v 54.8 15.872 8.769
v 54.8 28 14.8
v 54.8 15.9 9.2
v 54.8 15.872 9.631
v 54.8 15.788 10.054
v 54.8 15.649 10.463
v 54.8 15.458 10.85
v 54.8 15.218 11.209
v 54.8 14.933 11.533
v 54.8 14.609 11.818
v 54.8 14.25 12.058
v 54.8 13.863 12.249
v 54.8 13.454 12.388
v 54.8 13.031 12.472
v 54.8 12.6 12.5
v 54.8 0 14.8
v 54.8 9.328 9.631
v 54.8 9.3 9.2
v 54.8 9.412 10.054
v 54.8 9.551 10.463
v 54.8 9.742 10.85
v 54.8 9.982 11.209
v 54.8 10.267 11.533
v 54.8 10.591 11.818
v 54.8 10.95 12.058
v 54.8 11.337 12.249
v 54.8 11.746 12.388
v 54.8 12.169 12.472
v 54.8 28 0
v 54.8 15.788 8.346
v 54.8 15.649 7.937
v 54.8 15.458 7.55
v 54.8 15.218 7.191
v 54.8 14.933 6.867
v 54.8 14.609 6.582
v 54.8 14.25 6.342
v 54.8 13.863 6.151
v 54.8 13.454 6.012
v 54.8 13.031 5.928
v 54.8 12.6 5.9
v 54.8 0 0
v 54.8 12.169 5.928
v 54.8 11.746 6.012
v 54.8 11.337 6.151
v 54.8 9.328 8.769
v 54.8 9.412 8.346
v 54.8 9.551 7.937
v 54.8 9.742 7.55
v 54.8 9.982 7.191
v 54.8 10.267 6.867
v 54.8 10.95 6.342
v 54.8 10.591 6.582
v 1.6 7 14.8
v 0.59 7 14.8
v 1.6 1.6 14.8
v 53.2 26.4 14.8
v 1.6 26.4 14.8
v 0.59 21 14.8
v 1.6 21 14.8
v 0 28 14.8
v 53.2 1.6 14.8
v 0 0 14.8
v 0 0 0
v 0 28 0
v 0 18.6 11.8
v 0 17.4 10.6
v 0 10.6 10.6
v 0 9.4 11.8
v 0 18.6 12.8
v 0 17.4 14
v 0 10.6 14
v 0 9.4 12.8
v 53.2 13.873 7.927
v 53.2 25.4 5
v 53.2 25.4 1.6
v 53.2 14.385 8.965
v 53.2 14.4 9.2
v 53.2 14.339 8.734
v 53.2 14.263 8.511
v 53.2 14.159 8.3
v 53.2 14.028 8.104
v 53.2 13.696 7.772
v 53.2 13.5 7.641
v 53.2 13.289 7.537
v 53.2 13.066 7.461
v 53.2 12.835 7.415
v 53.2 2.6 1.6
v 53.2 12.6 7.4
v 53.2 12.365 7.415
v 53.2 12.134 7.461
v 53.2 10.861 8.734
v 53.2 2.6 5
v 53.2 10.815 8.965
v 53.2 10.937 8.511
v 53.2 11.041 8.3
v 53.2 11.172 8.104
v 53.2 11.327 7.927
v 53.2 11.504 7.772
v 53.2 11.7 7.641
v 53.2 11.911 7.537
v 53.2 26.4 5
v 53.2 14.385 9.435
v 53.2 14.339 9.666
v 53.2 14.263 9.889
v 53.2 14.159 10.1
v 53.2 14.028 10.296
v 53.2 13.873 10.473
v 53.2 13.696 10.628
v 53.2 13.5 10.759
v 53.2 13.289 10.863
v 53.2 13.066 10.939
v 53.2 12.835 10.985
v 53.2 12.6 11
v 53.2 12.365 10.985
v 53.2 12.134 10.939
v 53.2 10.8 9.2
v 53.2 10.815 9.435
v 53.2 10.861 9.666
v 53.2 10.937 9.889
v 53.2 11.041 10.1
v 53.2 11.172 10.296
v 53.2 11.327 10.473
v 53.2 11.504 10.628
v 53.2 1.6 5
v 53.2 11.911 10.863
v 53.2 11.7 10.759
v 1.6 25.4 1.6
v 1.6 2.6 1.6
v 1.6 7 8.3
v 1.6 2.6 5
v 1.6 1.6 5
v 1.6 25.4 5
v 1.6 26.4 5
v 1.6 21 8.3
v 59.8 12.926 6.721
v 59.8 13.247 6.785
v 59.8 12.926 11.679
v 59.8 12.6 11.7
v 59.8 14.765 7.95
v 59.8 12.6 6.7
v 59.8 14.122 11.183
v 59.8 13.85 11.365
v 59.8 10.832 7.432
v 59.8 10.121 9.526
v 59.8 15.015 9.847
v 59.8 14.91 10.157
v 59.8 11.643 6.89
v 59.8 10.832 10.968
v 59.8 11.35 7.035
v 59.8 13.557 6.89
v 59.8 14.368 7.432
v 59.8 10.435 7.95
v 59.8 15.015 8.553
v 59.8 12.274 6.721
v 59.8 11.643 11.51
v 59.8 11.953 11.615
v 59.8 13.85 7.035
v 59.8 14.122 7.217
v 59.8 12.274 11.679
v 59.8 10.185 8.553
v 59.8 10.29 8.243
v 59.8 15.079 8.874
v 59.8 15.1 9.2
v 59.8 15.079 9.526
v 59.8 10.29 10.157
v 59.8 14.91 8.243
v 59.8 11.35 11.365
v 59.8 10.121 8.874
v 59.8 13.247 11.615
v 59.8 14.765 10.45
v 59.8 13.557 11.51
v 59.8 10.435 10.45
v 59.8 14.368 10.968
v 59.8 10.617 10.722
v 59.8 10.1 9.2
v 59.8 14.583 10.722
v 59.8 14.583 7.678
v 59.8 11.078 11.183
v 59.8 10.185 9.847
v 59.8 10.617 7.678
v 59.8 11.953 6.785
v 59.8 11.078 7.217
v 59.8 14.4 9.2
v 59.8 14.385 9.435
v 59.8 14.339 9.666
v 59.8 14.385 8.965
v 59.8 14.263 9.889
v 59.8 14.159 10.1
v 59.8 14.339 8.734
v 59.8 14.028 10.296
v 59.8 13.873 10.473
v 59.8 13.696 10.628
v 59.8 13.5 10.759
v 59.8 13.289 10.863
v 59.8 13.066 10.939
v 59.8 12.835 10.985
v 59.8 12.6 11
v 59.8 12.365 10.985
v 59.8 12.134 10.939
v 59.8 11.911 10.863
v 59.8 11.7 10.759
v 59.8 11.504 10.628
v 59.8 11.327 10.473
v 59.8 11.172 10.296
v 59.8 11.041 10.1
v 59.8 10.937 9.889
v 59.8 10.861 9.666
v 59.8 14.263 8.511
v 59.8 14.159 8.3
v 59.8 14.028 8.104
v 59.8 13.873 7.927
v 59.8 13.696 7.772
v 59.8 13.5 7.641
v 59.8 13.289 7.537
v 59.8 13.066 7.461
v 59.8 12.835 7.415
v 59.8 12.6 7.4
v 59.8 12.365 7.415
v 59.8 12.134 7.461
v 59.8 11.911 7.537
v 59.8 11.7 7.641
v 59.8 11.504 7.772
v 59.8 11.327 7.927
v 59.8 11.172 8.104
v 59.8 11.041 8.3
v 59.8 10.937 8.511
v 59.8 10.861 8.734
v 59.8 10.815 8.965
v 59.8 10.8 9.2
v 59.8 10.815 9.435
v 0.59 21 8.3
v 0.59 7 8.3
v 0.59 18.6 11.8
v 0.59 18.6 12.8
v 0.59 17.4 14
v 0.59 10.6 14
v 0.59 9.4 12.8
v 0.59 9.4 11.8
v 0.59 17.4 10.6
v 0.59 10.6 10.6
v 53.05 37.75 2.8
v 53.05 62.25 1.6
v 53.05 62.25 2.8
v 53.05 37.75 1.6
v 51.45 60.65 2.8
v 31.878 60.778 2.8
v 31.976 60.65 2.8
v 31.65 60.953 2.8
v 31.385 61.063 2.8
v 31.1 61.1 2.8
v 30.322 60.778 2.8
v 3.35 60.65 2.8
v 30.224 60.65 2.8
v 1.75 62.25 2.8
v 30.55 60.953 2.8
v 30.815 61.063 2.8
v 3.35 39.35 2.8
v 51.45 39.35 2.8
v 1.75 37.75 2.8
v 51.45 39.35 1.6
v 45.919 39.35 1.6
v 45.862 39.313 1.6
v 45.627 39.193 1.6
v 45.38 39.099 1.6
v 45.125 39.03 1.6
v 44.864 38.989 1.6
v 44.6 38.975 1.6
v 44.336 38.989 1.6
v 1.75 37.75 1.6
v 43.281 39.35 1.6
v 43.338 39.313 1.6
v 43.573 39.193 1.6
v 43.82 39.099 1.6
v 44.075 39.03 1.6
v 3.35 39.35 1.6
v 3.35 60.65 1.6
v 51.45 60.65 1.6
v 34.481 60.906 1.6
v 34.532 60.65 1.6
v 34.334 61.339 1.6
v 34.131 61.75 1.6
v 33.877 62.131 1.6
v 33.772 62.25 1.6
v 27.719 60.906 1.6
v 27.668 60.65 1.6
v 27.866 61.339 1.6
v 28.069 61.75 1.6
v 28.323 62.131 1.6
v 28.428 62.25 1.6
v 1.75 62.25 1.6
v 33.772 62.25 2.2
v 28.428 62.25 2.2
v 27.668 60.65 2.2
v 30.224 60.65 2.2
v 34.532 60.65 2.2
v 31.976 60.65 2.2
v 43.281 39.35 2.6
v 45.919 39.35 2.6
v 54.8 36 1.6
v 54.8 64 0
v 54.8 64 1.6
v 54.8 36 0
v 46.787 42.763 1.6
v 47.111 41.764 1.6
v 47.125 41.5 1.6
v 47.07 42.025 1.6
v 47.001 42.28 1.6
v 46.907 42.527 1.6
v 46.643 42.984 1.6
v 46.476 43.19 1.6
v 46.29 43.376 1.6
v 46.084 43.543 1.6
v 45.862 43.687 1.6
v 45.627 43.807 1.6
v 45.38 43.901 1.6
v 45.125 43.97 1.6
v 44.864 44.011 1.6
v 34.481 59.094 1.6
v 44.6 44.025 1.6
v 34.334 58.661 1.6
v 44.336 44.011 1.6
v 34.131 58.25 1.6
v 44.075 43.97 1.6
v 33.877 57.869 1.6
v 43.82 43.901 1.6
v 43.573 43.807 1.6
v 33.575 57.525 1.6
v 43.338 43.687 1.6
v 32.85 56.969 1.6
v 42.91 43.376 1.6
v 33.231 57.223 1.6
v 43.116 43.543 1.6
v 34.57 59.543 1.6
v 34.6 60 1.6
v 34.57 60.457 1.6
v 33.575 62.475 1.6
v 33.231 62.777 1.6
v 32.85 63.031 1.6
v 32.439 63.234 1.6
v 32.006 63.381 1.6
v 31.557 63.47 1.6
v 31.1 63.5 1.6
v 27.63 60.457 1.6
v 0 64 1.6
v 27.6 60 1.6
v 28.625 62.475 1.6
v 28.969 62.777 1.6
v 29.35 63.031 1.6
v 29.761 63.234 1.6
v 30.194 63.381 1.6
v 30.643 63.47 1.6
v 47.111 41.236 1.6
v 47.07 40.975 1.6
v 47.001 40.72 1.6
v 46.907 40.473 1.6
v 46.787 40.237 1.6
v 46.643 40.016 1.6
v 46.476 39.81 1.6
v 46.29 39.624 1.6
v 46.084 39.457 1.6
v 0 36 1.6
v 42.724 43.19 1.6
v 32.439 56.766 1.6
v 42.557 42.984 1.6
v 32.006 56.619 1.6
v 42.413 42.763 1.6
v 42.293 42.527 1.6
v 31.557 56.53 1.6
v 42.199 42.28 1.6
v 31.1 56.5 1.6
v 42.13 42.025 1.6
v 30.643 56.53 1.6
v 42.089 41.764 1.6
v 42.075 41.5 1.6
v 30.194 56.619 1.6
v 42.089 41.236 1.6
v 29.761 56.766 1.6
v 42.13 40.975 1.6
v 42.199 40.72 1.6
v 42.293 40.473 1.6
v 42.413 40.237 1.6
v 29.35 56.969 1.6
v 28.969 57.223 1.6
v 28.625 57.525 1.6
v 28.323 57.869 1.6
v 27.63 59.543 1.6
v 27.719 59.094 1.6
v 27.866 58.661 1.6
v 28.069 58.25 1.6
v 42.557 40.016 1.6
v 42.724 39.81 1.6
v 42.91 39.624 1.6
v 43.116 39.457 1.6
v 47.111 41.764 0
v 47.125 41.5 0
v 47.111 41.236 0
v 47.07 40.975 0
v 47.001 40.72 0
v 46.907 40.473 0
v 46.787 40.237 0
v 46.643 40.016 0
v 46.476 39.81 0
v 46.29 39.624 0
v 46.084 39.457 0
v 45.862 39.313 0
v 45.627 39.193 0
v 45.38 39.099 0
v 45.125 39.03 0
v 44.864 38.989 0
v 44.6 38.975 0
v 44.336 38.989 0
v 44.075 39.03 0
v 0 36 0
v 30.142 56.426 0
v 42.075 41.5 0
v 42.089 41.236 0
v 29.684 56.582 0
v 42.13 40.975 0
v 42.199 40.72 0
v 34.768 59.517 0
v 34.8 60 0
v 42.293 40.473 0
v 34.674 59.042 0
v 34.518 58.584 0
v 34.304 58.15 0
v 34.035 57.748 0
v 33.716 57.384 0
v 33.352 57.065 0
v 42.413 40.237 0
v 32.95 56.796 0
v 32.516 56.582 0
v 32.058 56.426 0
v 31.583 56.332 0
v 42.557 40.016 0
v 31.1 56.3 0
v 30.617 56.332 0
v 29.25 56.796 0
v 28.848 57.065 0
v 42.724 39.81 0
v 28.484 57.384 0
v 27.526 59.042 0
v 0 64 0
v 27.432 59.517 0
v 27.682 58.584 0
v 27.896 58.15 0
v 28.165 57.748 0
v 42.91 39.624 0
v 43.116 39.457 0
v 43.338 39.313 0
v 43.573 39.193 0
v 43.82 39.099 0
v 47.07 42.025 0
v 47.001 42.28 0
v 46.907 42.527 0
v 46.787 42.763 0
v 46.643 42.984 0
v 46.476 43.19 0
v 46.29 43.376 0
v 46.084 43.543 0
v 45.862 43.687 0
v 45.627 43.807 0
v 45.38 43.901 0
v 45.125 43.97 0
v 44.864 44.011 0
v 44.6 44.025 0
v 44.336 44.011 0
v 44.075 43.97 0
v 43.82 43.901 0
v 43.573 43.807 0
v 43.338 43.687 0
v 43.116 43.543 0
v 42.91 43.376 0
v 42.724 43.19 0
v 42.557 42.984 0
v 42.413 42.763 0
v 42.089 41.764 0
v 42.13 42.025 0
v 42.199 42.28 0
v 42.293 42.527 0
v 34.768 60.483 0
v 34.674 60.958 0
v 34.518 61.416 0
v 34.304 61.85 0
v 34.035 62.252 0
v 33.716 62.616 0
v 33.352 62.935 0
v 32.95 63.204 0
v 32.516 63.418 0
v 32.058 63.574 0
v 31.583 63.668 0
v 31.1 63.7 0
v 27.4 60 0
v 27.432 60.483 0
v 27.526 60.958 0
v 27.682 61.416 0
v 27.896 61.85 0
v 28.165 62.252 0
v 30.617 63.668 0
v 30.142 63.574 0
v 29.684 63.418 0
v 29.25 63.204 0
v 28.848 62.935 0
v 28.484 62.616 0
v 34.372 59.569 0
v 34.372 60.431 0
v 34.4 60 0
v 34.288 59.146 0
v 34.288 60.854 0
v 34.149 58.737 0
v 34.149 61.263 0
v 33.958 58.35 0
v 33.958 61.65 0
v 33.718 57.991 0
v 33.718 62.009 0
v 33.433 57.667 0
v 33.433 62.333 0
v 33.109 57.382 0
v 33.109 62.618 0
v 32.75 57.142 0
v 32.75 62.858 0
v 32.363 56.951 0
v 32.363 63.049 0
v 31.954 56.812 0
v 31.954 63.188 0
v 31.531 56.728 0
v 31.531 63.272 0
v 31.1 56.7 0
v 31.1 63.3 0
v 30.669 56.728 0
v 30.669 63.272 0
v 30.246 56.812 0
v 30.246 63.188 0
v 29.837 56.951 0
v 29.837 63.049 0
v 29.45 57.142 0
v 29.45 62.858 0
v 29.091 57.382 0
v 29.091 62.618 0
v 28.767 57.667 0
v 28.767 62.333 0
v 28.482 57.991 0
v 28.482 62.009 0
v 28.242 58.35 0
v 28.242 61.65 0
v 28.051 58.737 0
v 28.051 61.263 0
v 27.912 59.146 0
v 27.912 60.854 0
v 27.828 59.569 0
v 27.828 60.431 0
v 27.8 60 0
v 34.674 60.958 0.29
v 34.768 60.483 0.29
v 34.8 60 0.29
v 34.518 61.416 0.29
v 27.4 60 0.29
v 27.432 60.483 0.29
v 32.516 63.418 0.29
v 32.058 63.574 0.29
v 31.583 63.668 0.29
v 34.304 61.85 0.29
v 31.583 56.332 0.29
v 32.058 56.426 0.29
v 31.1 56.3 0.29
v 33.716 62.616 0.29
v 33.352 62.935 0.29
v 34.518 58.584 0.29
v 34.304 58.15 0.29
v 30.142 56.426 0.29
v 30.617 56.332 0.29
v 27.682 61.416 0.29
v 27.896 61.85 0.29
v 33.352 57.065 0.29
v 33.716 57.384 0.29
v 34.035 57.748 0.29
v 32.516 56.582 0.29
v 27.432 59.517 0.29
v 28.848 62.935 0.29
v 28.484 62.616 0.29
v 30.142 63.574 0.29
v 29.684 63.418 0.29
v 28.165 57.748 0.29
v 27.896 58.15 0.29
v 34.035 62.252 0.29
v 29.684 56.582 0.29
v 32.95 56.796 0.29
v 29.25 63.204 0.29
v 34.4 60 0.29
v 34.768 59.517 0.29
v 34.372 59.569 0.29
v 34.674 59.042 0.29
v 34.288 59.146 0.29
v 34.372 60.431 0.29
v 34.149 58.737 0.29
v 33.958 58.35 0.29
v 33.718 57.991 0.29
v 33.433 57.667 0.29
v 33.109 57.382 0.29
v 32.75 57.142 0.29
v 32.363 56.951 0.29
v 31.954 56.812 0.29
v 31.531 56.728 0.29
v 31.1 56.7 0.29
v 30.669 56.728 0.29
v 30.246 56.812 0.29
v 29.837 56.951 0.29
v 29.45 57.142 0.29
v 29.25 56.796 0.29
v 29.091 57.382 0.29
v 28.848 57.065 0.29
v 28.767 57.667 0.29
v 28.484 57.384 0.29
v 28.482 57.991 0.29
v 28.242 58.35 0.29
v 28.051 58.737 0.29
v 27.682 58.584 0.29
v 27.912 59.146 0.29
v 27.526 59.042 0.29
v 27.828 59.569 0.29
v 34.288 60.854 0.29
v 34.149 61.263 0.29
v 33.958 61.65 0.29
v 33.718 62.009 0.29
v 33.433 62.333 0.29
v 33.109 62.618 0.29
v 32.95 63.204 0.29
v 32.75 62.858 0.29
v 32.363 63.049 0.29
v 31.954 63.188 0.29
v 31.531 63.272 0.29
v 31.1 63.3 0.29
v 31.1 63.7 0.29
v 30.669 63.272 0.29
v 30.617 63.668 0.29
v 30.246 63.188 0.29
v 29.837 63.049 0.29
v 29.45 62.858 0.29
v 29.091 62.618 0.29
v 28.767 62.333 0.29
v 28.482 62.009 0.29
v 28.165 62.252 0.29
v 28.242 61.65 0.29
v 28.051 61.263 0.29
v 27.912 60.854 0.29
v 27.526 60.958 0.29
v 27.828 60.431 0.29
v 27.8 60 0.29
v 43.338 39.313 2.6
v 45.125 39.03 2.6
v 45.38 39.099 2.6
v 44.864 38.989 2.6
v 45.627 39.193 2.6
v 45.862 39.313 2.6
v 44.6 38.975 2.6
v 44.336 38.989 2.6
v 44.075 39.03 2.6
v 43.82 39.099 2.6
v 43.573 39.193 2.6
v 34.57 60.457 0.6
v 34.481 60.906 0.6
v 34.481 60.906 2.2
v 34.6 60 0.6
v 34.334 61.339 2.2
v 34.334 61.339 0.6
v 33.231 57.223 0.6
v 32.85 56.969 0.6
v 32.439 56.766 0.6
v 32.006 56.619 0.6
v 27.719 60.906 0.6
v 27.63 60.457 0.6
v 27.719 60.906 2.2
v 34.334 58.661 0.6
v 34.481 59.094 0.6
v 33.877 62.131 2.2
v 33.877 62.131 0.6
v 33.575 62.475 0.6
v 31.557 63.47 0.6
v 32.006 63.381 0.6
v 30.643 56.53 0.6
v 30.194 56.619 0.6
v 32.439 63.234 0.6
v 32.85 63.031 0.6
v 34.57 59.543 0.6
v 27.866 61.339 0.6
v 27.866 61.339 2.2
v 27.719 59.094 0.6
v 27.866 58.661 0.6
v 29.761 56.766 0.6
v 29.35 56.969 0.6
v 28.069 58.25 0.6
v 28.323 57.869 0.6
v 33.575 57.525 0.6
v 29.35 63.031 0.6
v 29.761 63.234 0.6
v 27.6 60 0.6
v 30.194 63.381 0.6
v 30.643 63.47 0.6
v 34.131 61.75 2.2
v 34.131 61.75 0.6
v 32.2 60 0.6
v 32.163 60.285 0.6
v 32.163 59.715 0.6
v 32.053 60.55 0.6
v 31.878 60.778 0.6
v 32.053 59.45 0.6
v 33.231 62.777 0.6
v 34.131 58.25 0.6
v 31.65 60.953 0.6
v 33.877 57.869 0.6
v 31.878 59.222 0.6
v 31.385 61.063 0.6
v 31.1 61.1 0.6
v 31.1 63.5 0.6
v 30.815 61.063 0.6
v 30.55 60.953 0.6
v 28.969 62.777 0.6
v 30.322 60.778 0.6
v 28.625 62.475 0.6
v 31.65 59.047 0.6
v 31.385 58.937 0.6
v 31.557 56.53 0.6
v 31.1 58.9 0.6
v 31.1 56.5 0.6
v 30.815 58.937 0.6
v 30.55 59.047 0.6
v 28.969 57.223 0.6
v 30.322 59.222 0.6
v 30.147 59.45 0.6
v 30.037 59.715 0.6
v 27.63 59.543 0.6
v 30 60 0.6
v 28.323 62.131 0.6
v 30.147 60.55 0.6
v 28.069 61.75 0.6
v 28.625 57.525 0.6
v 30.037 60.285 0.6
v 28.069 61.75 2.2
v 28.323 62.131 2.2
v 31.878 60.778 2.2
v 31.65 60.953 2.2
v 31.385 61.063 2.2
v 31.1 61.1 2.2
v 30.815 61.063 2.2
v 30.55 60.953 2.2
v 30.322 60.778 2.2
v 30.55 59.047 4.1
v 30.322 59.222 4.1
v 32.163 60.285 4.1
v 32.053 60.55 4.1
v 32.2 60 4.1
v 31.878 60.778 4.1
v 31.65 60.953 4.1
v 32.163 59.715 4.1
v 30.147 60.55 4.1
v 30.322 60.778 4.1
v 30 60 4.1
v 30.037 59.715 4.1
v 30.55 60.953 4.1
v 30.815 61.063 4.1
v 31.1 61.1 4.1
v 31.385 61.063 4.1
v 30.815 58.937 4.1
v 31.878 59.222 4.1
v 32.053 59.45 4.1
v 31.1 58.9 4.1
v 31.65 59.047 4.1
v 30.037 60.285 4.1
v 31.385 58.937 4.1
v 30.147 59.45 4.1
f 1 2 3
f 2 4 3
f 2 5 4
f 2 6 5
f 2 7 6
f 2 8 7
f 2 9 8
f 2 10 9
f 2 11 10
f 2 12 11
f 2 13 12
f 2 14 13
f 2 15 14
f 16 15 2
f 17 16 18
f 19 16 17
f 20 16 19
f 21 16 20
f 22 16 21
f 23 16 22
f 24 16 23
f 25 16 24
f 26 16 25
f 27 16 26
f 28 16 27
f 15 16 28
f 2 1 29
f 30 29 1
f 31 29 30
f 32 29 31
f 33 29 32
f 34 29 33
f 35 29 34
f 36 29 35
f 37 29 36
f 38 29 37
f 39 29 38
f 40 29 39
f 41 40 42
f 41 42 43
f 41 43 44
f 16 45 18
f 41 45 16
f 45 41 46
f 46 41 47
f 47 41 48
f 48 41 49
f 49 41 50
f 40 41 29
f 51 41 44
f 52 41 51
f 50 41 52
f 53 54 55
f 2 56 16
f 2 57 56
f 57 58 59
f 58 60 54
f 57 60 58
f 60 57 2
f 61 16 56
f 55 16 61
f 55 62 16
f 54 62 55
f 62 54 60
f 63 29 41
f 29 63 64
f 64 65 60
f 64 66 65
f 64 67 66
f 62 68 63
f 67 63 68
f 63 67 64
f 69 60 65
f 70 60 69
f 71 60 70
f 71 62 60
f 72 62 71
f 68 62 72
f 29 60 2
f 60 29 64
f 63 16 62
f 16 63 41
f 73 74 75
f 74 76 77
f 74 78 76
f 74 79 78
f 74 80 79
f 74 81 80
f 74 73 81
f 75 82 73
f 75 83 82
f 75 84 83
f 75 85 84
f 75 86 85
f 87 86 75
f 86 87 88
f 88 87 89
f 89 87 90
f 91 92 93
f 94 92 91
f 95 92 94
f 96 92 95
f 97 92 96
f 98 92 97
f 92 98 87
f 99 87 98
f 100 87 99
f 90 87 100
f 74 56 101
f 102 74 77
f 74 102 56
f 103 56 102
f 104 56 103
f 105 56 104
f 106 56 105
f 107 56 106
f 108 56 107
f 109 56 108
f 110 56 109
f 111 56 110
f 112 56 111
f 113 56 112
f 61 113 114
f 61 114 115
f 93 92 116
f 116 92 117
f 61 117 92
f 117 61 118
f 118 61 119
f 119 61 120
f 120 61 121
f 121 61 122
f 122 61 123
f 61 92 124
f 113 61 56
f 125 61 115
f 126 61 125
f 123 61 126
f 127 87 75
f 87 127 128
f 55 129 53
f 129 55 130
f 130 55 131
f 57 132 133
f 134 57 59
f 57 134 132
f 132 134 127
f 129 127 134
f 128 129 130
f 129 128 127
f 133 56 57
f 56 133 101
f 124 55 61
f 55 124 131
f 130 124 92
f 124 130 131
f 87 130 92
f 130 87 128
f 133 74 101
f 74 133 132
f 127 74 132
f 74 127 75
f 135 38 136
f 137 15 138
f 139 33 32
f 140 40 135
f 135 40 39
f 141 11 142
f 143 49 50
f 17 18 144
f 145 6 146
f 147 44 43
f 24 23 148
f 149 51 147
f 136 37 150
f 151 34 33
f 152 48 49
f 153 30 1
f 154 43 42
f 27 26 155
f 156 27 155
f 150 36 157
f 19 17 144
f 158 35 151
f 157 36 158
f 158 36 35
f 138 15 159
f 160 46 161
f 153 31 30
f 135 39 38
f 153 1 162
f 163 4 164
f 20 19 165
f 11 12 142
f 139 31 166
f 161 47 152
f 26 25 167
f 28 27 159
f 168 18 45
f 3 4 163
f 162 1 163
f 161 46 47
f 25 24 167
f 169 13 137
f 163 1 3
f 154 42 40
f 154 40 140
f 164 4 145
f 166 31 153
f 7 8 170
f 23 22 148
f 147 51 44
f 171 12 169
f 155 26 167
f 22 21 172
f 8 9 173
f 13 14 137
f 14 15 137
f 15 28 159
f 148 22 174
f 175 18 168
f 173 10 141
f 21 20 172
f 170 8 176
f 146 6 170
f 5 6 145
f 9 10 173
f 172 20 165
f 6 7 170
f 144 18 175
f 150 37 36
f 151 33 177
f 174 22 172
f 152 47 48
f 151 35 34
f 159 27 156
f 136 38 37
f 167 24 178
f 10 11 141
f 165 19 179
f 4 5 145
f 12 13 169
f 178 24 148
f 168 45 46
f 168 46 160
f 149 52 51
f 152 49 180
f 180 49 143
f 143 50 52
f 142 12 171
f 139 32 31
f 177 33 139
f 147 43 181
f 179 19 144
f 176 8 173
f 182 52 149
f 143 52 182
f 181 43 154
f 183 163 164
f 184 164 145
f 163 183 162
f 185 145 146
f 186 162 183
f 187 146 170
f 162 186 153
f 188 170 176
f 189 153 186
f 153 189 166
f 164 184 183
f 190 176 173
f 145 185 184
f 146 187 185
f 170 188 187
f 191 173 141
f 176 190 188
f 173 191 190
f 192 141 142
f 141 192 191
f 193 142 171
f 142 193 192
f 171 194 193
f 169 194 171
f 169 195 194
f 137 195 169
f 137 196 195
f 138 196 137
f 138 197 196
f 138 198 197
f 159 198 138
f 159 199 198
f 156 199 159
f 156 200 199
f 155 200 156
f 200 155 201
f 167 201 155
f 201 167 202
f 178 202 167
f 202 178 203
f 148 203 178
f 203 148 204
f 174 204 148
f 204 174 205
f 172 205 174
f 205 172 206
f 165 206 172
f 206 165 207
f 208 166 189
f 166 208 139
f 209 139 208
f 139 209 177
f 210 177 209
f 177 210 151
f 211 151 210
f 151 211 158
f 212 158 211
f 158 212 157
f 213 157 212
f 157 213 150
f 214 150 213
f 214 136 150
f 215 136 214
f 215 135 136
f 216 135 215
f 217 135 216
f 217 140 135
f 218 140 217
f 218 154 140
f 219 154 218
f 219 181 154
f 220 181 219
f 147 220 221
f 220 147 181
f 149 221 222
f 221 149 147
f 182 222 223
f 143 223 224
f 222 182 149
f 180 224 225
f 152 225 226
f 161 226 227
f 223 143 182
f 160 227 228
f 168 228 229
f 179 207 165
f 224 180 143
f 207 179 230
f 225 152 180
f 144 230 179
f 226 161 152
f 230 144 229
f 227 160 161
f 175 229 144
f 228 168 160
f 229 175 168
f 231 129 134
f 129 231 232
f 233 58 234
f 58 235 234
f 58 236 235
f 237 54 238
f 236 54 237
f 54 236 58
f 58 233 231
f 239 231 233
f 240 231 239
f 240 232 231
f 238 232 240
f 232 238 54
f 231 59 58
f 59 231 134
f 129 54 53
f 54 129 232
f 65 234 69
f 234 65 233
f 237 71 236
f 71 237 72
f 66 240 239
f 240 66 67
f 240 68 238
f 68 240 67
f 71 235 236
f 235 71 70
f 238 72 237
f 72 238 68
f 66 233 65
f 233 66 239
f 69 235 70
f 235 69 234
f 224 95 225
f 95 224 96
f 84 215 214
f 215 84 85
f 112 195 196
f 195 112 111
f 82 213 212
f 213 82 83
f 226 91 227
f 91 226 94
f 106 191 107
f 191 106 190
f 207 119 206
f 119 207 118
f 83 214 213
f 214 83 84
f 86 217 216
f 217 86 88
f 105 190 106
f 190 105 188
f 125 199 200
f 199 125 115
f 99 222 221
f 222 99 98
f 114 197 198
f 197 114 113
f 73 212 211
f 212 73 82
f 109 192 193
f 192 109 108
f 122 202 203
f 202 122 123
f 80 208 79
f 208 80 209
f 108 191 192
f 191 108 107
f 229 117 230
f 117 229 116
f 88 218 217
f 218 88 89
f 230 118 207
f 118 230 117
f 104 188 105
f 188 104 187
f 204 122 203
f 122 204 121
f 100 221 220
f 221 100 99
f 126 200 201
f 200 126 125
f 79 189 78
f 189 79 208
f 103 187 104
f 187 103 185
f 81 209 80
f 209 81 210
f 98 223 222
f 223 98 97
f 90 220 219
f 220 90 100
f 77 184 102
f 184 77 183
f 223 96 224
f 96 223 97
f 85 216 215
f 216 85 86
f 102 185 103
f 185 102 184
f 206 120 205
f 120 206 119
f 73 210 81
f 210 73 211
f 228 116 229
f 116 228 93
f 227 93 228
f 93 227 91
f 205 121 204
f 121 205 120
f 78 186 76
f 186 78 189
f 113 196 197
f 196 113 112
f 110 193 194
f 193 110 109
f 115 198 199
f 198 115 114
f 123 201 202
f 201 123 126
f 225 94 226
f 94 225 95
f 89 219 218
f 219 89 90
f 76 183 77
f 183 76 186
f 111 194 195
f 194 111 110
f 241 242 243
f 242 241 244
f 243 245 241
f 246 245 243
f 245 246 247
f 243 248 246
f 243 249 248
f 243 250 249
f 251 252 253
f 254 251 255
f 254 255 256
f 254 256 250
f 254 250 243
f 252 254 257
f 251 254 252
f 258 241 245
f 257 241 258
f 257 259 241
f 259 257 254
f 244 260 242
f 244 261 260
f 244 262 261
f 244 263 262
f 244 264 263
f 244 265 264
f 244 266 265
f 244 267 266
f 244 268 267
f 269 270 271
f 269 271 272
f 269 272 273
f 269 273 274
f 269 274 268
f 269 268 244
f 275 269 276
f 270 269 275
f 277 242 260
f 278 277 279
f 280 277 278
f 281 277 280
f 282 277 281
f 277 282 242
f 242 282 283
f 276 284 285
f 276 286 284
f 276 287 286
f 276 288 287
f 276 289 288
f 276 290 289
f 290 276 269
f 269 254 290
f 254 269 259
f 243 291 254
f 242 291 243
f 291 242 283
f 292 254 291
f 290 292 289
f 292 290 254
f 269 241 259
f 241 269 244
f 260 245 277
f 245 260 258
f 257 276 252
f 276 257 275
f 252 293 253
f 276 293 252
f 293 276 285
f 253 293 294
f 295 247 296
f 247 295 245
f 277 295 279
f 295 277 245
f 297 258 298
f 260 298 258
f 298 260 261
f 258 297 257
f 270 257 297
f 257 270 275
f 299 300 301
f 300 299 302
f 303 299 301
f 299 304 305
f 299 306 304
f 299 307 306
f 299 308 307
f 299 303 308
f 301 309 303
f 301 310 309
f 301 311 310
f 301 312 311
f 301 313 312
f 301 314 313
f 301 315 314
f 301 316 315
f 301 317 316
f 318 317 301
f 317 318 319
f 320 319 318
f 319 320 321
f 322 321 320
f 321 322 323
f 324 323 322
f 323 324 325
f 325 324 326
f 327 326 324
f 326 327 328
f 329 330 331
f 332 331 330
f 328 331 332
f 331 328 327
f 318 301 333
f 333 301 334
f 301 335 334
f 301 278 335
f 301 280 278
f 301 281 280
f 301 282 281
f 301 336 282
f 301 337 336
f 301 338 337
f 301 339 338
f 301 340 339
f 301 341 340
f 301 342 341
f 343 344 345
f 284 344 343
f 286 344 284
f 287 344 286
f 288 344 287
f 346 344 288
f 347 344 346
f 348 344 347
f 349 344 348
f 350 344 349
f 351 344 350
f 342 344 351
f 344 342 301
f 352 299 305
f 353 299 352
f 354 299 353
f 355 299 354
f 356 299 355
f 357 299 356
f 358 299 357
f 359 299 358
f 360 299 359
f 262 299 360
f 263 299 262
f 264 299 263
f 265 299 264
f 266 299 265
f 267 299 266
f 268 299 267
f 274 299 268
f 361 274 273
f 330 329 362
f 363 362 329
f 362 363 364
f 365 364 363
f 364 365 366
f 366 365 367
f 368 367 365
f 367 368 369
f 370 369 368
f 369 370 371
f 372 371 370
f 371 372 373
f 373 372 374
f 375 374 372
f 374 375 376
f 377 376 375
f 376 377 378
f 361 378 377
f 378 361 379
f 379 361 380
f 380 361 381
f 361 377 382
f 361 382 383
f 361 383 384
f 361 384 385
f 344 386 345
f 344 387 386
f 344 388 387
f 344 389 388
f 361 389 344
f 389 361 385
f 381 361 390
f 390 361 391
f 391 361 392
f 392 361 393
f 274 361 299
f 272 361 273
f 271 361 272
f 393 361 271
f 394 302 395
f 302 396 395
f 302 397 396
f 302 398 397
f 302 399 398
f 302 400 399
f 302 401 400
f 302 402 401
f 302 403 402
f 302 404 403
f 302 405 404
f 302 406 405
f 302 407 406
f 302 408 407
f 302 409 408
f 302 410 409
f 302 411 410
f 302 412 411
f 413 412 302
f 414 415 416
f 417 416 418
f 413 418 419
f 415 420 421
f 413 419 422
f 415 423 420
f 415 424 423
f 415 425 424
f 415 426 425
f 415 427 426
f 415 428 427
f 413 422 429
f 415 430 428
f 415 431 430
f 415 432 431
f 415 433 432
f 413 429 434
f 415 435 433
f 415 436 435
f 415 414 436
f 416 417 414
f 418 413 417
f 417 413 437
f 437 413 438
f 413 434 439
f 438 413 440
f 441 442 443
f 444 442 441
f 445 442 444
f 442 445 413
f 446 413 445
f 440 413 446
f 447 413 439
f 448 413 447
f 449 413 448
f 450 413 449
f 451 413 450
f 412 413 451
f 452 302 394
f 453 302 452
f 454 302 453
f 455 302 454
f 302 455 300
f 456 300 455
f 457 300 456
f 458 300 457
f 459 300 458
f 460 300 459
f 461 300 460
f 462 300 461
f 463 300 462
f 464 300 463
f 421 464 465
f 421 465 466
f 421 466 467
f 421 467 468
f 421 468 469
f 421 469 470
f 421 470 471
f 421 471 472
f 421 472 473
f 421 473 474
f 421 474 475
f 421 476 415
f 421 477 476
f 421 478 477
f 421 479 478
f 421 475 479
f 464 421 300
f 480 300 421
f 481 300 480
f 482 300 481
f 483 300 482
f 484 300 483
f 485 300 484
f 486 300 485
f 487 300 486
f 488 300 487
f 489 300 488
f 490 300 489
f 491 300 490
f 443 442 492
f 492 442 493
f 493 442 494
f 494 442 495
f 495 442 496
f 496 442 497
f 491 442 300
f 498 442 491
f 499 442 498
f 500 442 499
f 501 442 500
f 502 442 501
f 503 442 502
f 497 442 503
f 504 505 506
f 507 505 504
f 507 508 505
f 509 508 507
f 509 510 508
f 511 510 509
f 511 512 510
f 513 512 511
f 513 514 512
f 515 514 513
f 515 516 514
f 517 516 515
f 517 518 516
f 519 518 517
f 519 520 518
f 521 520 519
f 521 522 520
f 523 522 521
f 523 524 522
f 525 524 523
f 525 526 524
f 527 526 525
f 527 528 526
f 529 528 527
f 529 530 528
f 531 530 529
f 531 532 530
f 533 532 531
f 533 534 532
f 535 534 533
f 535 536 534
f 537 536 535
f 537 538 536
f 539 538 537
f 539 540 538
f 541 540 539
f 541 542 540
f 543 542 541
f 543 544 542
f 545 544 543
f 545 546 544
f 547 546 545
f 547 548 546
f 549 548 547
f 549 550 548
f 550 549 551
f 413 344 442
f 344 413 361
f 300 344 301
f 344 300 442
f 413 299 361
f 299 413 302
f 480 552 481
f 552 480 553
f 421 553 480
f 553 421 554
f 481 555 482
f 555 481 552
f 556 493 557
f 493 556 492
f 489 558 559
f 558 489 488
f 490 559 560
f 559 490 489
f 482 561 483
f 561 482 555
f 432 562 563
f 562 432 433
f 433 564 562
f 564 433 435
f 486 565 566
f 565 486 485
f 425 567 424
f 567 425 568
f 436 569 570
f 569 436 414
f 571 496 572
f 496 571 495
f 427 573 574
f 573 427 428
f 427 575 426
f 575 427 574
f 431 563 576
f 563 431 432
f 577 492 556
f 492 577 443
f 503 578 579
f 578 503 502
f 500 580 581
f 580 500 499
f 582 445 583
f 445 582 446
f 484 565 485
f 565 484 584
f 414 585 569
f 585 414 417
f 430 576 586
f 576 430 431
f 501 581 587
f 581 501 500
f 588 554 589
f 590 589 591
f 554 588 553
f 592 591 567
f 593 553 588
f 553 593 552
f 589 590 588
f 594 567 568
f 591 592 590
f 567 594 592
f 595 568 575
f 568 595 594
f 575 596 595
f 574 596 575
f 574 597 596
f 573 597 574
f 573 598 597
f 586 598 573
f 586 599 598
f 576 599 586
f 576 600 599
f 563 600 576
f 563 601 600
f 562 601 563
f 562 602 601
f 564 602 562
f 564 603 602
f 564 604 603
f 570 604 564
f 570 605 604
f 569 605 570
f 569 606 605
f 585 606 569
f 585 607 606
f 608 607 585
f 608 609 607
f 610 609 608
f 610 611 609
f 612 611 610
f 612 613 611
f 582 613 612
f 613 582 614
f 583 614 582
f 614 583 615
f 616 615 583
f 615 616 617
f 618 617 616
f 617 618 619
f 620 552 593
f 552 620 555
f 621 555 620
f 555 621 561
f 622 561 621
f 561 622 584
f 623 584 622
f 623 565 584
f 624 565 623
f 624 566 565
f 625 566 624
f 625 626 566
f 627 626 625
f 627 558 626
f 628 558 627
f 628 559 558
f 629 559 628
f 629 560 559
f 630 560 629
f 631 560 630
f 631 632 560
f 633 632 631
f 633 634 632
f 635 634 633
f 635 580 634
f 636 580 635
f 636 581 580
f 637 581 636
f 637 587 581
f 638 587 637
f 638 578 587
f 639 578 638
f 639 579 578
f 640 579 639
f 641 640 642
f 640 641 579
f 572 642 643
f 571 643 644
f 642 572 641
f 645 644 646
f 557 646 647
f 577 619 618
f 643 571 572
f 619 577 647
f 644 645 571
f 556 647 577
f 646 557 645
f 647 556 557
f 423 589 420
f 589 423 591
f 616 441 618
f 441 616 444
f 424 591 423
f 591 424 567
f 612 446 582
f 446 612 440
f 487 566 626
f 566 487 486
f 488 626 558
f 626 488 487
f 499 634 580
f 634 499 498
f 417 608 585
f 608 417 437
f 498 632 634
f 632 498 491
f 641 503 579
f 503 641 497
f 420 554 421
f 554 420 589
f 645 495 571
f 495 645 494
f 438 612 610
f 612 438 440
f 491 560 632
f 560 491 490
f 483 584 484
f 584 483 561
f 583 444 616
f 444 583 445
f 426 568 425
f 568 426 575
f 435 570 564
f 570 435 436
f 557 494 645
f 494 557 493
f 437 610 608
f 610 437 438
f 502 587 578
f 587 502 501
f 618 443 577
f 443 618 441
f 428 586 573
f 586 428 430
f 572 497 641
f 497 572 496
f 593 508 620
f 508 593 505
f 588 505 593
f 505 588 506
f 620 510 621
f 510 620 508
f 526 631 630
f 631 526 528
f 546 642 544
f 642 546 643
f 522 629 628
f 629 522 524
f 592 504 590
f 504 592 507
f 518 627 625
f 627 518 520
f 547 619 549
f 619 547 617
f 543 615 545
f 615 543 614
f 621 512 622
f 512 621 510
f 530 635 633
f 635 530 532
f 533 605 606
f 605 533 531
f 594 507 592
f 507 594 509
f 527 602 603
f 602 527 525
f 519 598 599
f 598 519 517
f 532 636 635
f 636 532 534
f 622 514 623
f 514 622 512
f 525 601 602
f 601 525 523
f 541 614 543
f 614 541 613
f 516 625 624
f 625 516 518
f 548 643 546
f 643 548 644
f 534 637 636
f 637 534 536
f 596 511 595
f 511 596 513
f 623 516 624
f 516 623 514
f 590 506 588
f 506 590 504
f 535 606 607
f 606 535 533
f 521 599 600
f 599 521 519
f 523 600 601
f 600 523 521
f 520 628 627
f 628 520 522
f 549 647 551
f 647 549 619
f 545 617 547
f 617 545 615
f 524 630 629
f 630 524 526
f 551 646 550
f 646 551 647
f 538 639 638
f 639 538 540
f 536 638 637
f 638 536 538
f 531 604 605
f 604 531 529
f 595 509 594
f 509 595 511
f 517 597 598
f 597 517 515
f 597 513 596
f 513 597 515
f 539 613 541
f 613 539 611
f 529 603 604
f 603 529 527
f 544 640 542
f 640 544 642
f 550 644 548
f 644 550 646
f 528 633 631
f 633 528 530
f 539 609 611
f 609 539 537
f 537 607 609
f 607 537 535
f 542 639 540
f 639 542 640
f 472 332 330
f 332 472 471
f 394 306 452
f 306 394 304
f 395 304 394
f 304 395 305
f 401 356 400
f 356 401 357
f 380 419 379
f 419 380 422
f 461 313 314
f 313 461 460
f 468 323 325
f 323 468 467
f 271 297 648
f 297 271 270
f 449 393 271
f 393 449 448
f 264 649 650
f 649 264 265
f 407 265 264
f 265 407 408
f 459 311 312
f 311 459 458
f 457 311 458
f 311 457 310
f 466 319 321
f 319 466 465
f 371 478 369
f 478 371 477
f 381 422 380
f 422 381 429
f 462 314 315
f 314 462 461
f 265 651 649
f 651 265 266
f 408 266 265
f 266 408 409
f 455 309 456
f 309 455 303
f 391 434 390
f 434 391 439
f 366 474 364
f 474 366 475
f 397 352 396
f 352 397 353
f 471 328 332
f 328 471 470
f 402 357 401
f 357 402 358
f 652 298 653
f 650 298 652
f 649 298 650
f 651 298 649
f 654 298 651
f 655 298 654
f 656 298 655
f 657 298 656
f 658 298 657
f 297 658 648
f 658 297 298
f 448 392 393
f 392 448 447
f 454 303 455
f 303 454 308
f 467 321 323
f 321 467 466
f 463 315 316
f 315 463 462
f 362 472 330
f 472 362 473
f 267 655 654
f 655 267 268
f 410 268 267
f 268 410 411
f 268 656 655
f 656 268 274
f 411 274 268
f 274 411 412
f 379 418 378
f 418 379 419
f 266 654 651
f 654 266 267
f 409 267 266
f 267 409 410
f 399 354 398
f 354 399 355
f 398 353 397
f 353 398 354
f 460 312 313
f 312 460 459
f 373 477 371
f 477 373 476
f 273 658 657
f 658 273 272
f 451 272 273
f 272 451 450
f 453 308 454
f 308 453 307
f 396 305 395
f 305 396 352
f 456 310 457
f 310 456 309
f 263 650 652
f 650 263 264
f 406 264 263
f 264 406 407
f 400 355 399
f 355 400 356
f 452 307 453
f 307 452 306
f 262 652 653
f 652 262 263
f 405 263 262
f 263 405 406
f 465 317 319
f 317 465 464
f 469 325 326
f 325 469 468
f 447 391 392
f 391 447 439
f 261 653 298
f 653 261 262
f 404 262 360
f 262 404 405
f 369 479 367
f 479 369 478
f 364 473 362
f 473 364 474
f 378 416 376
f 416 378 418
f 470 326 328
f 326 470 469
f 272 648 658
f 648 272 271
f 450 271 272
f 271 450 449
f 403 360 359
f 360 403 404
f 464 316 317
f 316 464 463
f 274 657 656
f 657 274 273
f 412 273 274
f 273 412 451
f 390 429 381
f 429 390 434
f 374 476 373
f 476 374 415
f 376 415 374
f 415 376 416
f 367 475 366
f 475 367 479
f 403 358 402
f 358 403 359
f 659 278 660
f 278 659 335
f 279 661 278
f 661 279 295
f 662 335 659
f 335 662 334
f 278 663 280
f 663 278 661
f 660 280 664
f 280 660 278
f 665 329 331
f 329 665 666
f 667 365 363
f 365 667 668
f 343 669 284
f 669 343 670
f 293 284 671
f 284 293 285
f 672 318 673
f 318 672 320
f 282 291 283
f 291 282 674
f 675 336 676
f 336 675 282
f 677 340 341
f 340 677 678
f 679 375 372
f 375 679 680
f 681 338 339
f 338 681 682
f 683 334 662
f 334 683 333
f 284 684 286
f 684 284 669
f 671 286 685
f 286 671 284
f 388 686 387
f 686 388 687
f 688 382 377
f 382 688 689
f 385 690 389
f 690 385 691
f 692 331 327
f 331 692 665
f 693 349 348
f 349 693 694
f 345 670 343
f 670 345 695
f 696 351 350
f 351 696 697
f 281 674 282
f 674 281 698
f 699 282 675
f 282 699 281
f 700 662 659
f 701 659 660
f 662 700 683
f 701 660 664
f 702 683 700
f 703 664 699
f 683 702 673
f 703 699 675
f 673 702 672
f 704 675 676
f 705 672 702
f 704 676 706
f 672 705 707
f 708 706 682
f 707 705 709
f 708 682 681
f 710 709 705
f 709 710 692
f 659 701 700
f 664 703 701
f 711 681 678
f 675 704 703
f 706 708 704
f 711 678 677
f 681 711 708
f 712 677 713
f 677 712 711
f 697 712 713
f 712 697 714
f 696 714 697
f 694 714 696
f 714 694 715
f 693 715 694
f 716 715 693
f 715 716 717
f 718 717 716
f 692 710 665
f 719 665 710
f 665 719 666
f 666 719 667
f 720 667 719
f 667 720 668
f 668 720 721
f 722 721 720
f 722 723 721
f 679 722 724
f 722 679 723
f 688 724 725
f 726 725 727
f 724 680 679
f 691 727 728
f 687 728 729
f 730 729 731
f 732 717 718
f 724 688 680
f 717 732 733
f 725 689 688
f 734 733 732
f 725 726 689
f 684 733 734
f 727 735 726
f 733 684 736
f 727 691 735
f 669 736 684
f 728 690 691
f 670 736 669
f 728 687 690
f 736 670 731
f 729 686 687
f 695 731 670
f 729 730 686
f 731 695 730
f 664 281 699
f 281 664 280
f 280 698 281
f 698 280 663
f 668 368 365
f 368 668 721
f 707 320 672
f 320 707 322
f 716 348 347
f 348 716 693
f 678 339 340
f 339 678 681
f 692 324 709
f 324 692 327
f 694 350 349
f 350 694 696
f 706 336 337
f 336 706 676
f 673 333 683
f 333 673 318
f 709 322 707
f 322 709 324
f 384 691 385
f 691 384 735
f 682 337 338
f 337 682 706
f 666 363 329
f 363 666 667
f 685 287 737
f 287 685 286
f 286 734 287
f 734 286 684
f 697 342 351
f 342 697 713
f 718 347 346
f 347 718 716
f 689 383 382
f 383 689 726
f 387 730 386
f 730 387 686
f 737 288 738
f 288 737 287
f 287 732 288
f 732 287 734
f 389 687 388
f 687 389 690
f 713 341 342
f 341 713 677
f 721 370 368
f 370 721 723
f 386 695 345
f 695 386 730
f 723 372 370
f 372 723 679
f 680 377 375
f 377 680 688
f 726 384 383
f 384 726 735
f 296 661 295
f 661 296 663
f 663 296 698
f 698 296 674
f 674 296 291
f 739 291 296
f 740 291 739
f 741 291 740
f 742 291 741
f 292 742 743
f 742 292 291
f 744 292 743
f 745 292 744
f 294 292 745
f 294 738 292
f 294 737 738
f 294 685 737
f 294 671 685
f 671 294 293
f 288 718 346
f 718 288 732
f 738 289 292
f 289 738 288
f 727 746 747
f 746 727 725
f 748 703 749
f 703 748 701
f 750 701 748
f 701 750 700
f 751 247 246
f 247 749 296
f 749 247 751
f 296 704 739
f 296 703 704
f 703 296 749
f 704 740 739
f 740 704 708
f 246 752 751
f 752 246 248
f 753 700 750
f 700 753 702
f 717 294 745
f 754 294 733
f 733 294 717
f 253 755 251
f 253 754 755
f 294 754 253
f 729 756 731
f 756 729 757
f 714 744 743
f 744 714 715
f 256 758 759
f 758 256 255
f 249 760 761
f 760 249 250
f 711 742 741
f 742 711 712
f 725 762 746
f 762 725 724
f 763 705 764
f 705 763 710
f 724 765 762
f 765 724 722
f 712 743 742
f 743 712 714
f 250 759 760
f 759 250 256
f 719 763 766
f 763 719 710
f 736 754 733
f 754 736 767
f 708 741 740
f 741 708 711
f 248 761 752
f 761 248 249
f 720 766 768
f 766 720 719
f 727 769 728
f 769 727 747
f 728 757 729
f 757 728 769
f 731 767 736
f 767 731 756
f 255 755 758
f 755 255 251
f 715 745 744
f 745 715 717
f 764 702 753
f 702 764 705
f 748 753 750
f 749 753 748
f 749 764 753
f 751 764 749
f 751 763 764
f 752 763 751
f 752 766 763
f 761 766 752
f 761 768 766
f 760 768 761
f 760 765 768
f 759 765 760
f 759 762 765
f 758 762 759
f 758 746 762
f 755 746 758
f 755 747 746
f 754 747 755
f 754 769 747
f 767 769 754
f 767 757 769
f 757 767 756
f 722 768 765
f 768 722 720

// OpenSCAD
// SUPERSEDED: the case now in use is built by make_case_stl.py (cable slot open at the top, no soldering).

// Case for the smart charge switch, board rev 0.2 (kicad/smartsocket.kicad_pcb, 51.2 x 24 mm).
// Open in OpenSCAD (free), press F6, export STL.
//
// DRAFT: never rendered or printed. Positions come from the board file; heights are estimates
// from the parts' datasheets. Check them against the assembled board before printing.
//
// Closed and dust-tight: every opening is the size of what passes through it.
// - Charger socket: a socket-shaped hole. The board sits against that end wall, and the wall is
//   thinned to 0.6 mm around the socket, so the socket's face is only 0.8 mm in from the outside and any
//   plug goes fully in.
// - Phone cable: a round hole the size of the cable, with a strain-relief collar outside.
//   Thread the cut end in from outside before soldering it to the board.
// - Light: the LED is pressed into a 5.05 mm hole in the lid.
// - Button: no hole. The lid is 0.6 mm thin over U1's BOOT button, with a post underneath:
//   pressing the lid there presses the button.
// - U1's own USB port is closed in: programs load over Wi-Fi or from the app. For a backup
//   update over USB, take the lid off.
//
// Board coordinates used below: x from the charger end (left), y from the back edge, both in mm,
// z above the board's top surface (negative = underside).

// ---- from the board file ----
board_l = 51.2;
board_w = 24;
board_t = 1.6;
j1_y    = 12.0;     // centre of the charger socket across the board
led_x   = 43.0;     // LED centre (between its two legs)
led_y   = 20.5;
cable_y = 10.6;     // phone cable leaves the right end here (J2's middle pad)
button_x = 29.5;    // U1's BOOT button: far end from its USB port, D6 corner (photo, 2026-10-16)
button_y = 2.0;

// ---- estimates: measure on the assembled board ----
under_h = 3.4;      // resistors and diode lying flat on the underside, plus their joints
top_h   = 7.6;      // tallest part above the board (J1's socket top)
j1_z    = 5.7;      // centre height of the charger socket
sock_w  = 9.2;      // USB-C socket face, plus 0.2 mm clearance
sock_h  = 3.4;
sock_out = 0.6;     // how far the socket sticks out past the module's (and the board's) edge
button_top = 4.4;   // top of U1's BOOT button above the board
cable_d = 3.4;      // cable diameter: 11 mm round by paper strip (2026-10-28), minus the paper; the hole is 0.2 mm bigger
cable_z = 2.6;      // cable centre height above the board where it leaves

// ---- printing choices ----
wall = 1.6;
thin = 0.6;         // the wall around the charger socket: its face ends 0.8 mm inside the outer surface
gap  = 0.4;         // clearance around the board (none at the charger end)
lip  = 1.2;         // how far the lid drops into the base
rail = 1.0;         // ledge the board rests on, along both long walls (the board edge has no parts)
skin = 0.6;         // lid thickness over the button

in_l = board_l + gap;          // no gap at the charger end
in_w = board_w + 2 * gap;
out_l = in_l + 2 * wall;
out_w = in_w + 2 * wall;
out_h = wall + under_h + board_t + top_h + 0.6;

// board coordinates to case coordinates
function cx(x) = wall + x;
function cy(y) = wall + gap + y;
function cz(z) = wall + under_h + board_t + z;

module base() {
    difference() {
        union() {
            difference() {
                cube([out_l, out_w, out_h]);
                translate([wall, wall, wall]) cube([in_l, in_w, out_h]);
            }
            // rails under the two long board edges
            for (y = [wall, out_w - wall - rail])
                translate([wall, y, wall]) cube([in_l, rail, under_h]);
            // strain-relief collar around the cable hole
            translate([out_l, cy(cable_y), cz(cable_z)]) rotate([0, 90, 0])
                cylinder(d1 = cable_d + 3.2, d2 = cable_d + 1.6, h = 5, $fn = 48);
        }
        // charger socket: thin the wall from inside, then a socket-shaped hole through what is left
        translate([wall - (wall - thin) - 0.01, cy(j1_y) - 7, cz(j1_z) - 4]) cube([wall - thin + 0.02, 14, 8]);
        translate([-1, cy(j1_y), cz(j1_z)]) rotate([0, 90, 0]) linear_extrude(wall + 2)
            offset(r = 1.2) square([sock_h - 2.4, sock_w - 2.4], center = true);
        // phone cable: round hole through the wall and the collar
        translate([out_l - wall - 1, cy(cable_y), cz(cable_z)]) rotate([0, 90, 0])
            cylinder(d = cable_d + 0.2, h = wall + 8, $fn = 48);
    }
}

module lid() {
    // The lid is printed outer face down and turned over onto the base, which mirrors y.
    bx = cx(button_x);
    by = out_w - cy(button_y);
    post = cz(top_h + 0.6) - cz(button_top) - 0.3;  // from the lid's underside to just above the button
    difference() {
        union() {
            cube([out_l, out_w, wall]);
            translate([wall + 0.15, wall + 0.15, wall]) difference() {
                cube([in_l - 0.3, in_w - 0.3, lip]);
                translate([wall, wall, -1]) cube([in_l - 0.3 - 2 * wall, in_w - 0.3 - 2 * wall, lip + 2]);
            }
        }
        // the light is pressed into this hole
        translate([cx(led_x), out_w - cy(led_y), -1]) cylinder(d = 5.05, h = wall + 2, $fn = 60);
        // thin the lid over the button (from the inside), leaving a 0.6 mm skin to press
        translate([bx, by, skin]) cylinder(d = 7, h = wall, $fn = 48);
        // a small ring groove on the outside shows where to press
        translate([bx, by, -0.01]) difference() {
            cylinder(d = 7.4, h = 0.3, $fn = 48);
            cylinder(d = 6.6, h = 0.3, $fn = 48);
        }
    }
    // the post that reaches down to the button
    translate([bx, by, skin]) cylinder(d = 2.2, h = post, $fn = 24);
}

base();
translate([0, out_w + 8, 0]) lid();   // printed flat next to the base
